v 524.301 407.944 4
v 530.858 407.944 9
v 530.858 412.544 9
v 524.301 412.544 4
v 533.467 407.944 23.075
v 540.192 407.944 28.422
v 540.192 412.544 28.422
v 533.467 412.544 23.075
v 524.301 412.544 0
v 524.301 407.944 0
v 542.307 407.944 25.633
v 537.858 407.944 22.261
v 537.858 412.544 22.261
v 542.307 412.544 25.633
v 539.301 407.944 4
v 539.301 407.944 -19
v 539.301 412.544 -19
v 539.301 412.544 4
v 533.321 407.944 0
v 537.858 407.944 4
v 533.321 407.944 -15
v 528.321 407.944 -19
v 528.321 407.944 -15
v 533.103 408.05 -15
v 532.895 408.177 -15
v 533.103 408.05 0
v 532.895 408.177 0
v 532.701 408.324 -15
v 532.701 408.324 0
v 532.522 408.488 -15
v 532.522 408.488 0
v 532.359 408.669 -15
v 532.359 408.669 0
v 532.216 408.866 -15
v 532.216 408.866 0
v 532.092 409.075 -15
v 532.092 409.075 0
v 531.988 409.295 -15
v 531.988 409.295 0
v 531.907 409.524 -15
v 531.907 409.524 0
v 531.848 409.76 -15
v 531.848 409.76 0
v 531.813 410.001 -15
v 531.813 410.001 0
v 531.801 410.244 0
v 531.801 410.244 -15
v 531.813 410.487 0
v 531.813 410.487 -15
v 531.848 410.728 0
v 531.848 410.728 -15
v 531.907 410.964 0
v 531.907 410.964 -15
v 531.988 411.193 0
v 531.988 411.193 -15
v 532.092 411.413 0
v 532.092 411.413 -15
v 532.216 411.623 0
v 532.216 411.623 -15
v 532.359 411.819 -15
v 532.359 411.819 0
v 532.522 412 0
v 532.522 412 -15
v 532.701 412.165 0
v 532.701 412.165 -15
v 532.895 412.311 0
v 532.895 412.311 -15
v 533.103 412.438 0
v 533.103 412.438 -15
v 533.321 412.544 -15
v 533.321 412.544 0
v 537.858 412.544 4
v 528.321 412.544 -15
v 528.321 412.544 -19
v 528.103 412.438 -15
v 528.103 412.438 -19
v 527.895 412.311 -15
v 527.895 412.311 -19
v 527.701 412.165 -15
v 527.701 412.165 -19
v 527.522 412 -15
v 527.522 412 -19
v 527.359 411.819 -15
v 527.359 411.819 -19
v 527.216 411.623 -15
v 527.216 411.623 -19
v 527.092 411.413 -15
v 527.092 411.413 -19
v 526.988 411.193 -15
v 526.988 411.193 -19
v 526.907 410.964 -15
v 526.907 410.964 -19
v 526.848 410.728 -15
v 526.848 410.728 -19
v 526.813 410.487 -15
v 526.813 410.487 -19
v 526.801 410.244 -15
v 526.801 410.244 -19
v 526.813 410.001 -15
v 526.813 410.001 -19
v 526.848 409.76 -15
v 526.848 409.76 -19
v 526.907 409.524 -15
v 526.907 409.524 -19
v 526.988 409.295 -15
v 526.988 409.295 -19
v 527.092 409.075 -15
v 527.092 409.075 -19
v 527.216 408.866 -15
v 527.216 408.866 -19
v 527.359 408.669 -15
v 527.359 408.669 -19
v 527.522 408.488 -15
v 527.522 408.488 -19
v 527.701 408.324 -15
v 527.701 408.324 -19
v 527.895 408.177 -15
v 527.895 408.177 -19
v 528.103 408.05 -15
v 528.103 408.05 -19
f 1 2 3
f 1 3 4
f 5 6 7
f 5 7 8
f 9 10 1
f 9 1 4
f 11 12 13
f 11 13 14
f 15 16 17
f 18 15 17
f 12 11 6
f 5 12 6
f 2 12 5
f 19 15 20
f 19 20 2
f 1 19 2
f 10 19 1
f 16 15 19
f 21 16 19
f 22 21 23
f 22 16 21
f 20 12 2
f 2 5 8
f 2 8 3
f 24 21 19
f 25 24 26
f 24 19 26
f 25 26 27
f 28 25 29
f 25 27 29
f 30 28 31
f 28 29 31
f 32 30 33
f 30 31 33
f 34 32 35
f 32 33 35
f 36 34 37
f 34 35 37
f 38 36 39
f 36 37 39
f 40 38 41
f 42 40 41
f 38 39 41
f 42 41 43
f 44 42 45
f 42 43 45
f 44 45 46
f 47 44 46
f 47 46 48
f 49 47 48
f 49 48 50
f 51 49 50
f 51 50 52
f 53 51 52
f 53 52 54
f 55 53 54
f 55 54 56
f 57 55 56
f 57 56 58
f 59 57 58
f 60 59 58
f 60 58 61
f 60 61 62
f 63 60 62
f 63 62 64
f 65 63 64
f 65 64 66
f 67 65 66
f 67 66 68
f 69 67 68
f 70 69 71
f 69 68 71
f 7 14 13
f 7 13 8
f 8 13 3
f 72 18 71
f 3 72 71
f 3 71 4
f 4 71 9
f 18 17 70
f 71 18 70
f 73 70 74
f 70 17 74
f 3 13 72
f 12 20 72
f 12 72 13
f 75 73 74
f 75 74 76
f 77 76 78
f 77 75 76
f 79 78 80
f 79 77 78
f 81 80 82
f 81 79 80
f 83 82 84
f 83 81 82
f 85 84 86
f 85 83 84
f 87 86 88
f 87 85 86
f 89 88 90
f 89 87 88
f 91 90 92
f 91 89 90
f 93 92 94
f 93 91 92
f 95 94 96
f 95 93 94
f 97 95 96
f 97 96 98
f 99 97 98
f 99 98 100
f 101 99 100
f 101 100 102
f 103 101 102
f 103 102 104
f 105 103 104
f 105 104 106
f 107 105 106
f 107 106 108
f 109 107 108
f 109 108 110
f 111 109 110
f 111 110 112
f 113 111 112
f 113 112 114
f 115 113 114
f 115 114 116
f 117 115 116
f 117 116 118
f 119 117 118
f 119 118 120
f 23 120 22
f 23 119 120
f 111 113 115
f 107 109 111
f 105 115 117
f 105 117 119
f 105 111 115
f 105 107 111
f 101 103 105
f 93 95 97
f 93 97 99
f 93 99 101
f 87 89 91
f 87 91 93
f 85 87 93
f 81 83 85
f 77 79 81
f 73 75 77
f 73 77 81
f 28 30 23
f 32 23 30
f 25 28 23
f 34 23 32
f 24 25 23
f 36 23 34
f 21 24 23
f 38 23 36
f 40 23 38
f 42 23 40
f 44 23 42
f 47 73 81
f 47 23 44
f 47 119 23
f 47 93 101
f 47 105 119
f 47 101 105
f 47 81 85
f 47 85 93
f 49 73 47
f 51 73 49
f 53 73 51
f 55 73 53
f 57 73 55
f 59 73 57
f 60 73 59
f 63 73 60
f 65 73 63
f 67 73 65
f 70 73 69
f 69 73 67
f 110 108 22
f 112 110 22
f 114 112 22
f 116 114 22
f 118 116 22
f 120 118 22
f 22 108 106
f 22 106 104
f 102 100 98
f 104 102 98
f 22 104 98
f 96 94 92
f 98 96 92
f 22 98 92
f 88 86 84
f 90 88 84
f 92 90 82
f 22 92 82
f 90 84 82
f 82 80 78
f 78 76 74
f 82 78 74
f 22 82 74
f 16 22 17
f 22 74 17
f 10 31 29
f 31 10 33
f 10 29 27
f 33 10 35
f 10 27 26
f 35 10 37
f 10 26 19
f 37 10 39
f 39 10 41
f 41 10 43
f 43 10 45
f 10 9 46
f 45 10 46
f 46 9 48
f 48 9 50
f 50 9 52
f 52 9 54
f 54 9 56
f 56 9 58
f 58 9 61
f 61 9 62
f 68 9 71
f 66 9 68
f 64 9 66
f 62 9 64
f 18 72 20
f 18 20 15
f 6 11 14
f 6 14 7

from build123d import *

# Parameters (mm, degrees)
EXTRUDE_1_DEPTH     = 15
EXTRUDE_2_DEPTH     = 4
SKETCH_3_W          = 15
SKETCH_3_H          = 5
EXTRUDE_3_DEPTH     = 4
EXTRUDE_4_DEPTH     = 2.5
SKETCH_5_W          = 22.090290278
SKETCH_5_H          = 0.2
CUT_EXTRUDE_1_DEPTH = 48.422190659


with BuildPart() as part:
    # 草图1 → 凸台-拉伸1 (new body)
    with BuildSketch(Plane.XY):
        with BuildLine():
            Line((539.301234579, 412.744075086), (539.301234579, 407.744075086))
            Line((539.301234579, 407.744075086), (534.301234579, 407.744075086))
            ThreePointArc((534.301234579, 407.744075086), (531.801234579, 410.244075086), (534.301234579, 412.744075086))
            Line((534.301234579, 412.744075086), (539.301234579, 412.744075086))
        make_face()
    extrude(amount=-EXTRUDE_1_DEPTH)

    # 草图2 → 凸台-拉伸2 (add)
    with BuildSketch(Plane(origin=(0, 0, -15), x_dir=(-1, 0, 0), z_dir=(0, 0, -1))):
        with BuildLine():
            Line((-539.301234579, 412.744075086), (-529.301234579, 412.744075086))
            ThreePointArc((-529.301234579, 412.744075086), (-526.801234579, 410.244075086), (-529.301234579, 407.744075086))
            Line((-529.301234579, 407.744075086), (-539.301234579, 407.744075086))
            Line((-539.301234579, 407.744075086), (-539.301234579, 412.744075086))
        make_face()
    extrude(amount=EXTRUDE_2_DEPTH)

    # 草图3 → 凸台-拉伸3 (add)
    with BuildSketch(Plane.XY):
        with Locations((531.801234579, 410.244075086)):
            Rectangle(SKETCH_3_W, SKETCH_3_H)
    extrude(amount=EXTRUDE_3_DEPTH)

    # 草图4 → 凸台-拉伸4 (add, symmetric)
    with BuildSketch(Plane(origin=(0, 410.244075086, 0), x_dir=(-1, 0, 0), z_dir=(0, -1, 0))):
        Polygon((-524.301234579, -4), (-537.858436246, -4), (-537.858436246, -22.261188512), (-542.306519396, -25.63298203), (-540.192207397, -28.422190659), (-533.467268804, -23.075095635), (-530.858436246, -9), align=None)
    extrude(amount=EXTRUDE_4_DEPTH, both=True)

    # 草图5 → 切除-拉伸1 (cut, through all)
    with BuildSketch(Plane(origin=(0, 0, -19), x_dir=(-1, 0, 0), z_dir=(0, 0, -1))):
        with Locations((-533.503634439, 412.644075086)):
            Rectangle(SKETCH_5_W, SKETCH_5_H)
        with Locations((-533.503634439, 407.844075086)):
            Rectangle(SKETCH_5_W, SKETCH_5_H)
    extrude(amount=-CUT_EXTRUDE_1_DEPTH, mode=Mode.SUBTRACT)


solid = part.part
